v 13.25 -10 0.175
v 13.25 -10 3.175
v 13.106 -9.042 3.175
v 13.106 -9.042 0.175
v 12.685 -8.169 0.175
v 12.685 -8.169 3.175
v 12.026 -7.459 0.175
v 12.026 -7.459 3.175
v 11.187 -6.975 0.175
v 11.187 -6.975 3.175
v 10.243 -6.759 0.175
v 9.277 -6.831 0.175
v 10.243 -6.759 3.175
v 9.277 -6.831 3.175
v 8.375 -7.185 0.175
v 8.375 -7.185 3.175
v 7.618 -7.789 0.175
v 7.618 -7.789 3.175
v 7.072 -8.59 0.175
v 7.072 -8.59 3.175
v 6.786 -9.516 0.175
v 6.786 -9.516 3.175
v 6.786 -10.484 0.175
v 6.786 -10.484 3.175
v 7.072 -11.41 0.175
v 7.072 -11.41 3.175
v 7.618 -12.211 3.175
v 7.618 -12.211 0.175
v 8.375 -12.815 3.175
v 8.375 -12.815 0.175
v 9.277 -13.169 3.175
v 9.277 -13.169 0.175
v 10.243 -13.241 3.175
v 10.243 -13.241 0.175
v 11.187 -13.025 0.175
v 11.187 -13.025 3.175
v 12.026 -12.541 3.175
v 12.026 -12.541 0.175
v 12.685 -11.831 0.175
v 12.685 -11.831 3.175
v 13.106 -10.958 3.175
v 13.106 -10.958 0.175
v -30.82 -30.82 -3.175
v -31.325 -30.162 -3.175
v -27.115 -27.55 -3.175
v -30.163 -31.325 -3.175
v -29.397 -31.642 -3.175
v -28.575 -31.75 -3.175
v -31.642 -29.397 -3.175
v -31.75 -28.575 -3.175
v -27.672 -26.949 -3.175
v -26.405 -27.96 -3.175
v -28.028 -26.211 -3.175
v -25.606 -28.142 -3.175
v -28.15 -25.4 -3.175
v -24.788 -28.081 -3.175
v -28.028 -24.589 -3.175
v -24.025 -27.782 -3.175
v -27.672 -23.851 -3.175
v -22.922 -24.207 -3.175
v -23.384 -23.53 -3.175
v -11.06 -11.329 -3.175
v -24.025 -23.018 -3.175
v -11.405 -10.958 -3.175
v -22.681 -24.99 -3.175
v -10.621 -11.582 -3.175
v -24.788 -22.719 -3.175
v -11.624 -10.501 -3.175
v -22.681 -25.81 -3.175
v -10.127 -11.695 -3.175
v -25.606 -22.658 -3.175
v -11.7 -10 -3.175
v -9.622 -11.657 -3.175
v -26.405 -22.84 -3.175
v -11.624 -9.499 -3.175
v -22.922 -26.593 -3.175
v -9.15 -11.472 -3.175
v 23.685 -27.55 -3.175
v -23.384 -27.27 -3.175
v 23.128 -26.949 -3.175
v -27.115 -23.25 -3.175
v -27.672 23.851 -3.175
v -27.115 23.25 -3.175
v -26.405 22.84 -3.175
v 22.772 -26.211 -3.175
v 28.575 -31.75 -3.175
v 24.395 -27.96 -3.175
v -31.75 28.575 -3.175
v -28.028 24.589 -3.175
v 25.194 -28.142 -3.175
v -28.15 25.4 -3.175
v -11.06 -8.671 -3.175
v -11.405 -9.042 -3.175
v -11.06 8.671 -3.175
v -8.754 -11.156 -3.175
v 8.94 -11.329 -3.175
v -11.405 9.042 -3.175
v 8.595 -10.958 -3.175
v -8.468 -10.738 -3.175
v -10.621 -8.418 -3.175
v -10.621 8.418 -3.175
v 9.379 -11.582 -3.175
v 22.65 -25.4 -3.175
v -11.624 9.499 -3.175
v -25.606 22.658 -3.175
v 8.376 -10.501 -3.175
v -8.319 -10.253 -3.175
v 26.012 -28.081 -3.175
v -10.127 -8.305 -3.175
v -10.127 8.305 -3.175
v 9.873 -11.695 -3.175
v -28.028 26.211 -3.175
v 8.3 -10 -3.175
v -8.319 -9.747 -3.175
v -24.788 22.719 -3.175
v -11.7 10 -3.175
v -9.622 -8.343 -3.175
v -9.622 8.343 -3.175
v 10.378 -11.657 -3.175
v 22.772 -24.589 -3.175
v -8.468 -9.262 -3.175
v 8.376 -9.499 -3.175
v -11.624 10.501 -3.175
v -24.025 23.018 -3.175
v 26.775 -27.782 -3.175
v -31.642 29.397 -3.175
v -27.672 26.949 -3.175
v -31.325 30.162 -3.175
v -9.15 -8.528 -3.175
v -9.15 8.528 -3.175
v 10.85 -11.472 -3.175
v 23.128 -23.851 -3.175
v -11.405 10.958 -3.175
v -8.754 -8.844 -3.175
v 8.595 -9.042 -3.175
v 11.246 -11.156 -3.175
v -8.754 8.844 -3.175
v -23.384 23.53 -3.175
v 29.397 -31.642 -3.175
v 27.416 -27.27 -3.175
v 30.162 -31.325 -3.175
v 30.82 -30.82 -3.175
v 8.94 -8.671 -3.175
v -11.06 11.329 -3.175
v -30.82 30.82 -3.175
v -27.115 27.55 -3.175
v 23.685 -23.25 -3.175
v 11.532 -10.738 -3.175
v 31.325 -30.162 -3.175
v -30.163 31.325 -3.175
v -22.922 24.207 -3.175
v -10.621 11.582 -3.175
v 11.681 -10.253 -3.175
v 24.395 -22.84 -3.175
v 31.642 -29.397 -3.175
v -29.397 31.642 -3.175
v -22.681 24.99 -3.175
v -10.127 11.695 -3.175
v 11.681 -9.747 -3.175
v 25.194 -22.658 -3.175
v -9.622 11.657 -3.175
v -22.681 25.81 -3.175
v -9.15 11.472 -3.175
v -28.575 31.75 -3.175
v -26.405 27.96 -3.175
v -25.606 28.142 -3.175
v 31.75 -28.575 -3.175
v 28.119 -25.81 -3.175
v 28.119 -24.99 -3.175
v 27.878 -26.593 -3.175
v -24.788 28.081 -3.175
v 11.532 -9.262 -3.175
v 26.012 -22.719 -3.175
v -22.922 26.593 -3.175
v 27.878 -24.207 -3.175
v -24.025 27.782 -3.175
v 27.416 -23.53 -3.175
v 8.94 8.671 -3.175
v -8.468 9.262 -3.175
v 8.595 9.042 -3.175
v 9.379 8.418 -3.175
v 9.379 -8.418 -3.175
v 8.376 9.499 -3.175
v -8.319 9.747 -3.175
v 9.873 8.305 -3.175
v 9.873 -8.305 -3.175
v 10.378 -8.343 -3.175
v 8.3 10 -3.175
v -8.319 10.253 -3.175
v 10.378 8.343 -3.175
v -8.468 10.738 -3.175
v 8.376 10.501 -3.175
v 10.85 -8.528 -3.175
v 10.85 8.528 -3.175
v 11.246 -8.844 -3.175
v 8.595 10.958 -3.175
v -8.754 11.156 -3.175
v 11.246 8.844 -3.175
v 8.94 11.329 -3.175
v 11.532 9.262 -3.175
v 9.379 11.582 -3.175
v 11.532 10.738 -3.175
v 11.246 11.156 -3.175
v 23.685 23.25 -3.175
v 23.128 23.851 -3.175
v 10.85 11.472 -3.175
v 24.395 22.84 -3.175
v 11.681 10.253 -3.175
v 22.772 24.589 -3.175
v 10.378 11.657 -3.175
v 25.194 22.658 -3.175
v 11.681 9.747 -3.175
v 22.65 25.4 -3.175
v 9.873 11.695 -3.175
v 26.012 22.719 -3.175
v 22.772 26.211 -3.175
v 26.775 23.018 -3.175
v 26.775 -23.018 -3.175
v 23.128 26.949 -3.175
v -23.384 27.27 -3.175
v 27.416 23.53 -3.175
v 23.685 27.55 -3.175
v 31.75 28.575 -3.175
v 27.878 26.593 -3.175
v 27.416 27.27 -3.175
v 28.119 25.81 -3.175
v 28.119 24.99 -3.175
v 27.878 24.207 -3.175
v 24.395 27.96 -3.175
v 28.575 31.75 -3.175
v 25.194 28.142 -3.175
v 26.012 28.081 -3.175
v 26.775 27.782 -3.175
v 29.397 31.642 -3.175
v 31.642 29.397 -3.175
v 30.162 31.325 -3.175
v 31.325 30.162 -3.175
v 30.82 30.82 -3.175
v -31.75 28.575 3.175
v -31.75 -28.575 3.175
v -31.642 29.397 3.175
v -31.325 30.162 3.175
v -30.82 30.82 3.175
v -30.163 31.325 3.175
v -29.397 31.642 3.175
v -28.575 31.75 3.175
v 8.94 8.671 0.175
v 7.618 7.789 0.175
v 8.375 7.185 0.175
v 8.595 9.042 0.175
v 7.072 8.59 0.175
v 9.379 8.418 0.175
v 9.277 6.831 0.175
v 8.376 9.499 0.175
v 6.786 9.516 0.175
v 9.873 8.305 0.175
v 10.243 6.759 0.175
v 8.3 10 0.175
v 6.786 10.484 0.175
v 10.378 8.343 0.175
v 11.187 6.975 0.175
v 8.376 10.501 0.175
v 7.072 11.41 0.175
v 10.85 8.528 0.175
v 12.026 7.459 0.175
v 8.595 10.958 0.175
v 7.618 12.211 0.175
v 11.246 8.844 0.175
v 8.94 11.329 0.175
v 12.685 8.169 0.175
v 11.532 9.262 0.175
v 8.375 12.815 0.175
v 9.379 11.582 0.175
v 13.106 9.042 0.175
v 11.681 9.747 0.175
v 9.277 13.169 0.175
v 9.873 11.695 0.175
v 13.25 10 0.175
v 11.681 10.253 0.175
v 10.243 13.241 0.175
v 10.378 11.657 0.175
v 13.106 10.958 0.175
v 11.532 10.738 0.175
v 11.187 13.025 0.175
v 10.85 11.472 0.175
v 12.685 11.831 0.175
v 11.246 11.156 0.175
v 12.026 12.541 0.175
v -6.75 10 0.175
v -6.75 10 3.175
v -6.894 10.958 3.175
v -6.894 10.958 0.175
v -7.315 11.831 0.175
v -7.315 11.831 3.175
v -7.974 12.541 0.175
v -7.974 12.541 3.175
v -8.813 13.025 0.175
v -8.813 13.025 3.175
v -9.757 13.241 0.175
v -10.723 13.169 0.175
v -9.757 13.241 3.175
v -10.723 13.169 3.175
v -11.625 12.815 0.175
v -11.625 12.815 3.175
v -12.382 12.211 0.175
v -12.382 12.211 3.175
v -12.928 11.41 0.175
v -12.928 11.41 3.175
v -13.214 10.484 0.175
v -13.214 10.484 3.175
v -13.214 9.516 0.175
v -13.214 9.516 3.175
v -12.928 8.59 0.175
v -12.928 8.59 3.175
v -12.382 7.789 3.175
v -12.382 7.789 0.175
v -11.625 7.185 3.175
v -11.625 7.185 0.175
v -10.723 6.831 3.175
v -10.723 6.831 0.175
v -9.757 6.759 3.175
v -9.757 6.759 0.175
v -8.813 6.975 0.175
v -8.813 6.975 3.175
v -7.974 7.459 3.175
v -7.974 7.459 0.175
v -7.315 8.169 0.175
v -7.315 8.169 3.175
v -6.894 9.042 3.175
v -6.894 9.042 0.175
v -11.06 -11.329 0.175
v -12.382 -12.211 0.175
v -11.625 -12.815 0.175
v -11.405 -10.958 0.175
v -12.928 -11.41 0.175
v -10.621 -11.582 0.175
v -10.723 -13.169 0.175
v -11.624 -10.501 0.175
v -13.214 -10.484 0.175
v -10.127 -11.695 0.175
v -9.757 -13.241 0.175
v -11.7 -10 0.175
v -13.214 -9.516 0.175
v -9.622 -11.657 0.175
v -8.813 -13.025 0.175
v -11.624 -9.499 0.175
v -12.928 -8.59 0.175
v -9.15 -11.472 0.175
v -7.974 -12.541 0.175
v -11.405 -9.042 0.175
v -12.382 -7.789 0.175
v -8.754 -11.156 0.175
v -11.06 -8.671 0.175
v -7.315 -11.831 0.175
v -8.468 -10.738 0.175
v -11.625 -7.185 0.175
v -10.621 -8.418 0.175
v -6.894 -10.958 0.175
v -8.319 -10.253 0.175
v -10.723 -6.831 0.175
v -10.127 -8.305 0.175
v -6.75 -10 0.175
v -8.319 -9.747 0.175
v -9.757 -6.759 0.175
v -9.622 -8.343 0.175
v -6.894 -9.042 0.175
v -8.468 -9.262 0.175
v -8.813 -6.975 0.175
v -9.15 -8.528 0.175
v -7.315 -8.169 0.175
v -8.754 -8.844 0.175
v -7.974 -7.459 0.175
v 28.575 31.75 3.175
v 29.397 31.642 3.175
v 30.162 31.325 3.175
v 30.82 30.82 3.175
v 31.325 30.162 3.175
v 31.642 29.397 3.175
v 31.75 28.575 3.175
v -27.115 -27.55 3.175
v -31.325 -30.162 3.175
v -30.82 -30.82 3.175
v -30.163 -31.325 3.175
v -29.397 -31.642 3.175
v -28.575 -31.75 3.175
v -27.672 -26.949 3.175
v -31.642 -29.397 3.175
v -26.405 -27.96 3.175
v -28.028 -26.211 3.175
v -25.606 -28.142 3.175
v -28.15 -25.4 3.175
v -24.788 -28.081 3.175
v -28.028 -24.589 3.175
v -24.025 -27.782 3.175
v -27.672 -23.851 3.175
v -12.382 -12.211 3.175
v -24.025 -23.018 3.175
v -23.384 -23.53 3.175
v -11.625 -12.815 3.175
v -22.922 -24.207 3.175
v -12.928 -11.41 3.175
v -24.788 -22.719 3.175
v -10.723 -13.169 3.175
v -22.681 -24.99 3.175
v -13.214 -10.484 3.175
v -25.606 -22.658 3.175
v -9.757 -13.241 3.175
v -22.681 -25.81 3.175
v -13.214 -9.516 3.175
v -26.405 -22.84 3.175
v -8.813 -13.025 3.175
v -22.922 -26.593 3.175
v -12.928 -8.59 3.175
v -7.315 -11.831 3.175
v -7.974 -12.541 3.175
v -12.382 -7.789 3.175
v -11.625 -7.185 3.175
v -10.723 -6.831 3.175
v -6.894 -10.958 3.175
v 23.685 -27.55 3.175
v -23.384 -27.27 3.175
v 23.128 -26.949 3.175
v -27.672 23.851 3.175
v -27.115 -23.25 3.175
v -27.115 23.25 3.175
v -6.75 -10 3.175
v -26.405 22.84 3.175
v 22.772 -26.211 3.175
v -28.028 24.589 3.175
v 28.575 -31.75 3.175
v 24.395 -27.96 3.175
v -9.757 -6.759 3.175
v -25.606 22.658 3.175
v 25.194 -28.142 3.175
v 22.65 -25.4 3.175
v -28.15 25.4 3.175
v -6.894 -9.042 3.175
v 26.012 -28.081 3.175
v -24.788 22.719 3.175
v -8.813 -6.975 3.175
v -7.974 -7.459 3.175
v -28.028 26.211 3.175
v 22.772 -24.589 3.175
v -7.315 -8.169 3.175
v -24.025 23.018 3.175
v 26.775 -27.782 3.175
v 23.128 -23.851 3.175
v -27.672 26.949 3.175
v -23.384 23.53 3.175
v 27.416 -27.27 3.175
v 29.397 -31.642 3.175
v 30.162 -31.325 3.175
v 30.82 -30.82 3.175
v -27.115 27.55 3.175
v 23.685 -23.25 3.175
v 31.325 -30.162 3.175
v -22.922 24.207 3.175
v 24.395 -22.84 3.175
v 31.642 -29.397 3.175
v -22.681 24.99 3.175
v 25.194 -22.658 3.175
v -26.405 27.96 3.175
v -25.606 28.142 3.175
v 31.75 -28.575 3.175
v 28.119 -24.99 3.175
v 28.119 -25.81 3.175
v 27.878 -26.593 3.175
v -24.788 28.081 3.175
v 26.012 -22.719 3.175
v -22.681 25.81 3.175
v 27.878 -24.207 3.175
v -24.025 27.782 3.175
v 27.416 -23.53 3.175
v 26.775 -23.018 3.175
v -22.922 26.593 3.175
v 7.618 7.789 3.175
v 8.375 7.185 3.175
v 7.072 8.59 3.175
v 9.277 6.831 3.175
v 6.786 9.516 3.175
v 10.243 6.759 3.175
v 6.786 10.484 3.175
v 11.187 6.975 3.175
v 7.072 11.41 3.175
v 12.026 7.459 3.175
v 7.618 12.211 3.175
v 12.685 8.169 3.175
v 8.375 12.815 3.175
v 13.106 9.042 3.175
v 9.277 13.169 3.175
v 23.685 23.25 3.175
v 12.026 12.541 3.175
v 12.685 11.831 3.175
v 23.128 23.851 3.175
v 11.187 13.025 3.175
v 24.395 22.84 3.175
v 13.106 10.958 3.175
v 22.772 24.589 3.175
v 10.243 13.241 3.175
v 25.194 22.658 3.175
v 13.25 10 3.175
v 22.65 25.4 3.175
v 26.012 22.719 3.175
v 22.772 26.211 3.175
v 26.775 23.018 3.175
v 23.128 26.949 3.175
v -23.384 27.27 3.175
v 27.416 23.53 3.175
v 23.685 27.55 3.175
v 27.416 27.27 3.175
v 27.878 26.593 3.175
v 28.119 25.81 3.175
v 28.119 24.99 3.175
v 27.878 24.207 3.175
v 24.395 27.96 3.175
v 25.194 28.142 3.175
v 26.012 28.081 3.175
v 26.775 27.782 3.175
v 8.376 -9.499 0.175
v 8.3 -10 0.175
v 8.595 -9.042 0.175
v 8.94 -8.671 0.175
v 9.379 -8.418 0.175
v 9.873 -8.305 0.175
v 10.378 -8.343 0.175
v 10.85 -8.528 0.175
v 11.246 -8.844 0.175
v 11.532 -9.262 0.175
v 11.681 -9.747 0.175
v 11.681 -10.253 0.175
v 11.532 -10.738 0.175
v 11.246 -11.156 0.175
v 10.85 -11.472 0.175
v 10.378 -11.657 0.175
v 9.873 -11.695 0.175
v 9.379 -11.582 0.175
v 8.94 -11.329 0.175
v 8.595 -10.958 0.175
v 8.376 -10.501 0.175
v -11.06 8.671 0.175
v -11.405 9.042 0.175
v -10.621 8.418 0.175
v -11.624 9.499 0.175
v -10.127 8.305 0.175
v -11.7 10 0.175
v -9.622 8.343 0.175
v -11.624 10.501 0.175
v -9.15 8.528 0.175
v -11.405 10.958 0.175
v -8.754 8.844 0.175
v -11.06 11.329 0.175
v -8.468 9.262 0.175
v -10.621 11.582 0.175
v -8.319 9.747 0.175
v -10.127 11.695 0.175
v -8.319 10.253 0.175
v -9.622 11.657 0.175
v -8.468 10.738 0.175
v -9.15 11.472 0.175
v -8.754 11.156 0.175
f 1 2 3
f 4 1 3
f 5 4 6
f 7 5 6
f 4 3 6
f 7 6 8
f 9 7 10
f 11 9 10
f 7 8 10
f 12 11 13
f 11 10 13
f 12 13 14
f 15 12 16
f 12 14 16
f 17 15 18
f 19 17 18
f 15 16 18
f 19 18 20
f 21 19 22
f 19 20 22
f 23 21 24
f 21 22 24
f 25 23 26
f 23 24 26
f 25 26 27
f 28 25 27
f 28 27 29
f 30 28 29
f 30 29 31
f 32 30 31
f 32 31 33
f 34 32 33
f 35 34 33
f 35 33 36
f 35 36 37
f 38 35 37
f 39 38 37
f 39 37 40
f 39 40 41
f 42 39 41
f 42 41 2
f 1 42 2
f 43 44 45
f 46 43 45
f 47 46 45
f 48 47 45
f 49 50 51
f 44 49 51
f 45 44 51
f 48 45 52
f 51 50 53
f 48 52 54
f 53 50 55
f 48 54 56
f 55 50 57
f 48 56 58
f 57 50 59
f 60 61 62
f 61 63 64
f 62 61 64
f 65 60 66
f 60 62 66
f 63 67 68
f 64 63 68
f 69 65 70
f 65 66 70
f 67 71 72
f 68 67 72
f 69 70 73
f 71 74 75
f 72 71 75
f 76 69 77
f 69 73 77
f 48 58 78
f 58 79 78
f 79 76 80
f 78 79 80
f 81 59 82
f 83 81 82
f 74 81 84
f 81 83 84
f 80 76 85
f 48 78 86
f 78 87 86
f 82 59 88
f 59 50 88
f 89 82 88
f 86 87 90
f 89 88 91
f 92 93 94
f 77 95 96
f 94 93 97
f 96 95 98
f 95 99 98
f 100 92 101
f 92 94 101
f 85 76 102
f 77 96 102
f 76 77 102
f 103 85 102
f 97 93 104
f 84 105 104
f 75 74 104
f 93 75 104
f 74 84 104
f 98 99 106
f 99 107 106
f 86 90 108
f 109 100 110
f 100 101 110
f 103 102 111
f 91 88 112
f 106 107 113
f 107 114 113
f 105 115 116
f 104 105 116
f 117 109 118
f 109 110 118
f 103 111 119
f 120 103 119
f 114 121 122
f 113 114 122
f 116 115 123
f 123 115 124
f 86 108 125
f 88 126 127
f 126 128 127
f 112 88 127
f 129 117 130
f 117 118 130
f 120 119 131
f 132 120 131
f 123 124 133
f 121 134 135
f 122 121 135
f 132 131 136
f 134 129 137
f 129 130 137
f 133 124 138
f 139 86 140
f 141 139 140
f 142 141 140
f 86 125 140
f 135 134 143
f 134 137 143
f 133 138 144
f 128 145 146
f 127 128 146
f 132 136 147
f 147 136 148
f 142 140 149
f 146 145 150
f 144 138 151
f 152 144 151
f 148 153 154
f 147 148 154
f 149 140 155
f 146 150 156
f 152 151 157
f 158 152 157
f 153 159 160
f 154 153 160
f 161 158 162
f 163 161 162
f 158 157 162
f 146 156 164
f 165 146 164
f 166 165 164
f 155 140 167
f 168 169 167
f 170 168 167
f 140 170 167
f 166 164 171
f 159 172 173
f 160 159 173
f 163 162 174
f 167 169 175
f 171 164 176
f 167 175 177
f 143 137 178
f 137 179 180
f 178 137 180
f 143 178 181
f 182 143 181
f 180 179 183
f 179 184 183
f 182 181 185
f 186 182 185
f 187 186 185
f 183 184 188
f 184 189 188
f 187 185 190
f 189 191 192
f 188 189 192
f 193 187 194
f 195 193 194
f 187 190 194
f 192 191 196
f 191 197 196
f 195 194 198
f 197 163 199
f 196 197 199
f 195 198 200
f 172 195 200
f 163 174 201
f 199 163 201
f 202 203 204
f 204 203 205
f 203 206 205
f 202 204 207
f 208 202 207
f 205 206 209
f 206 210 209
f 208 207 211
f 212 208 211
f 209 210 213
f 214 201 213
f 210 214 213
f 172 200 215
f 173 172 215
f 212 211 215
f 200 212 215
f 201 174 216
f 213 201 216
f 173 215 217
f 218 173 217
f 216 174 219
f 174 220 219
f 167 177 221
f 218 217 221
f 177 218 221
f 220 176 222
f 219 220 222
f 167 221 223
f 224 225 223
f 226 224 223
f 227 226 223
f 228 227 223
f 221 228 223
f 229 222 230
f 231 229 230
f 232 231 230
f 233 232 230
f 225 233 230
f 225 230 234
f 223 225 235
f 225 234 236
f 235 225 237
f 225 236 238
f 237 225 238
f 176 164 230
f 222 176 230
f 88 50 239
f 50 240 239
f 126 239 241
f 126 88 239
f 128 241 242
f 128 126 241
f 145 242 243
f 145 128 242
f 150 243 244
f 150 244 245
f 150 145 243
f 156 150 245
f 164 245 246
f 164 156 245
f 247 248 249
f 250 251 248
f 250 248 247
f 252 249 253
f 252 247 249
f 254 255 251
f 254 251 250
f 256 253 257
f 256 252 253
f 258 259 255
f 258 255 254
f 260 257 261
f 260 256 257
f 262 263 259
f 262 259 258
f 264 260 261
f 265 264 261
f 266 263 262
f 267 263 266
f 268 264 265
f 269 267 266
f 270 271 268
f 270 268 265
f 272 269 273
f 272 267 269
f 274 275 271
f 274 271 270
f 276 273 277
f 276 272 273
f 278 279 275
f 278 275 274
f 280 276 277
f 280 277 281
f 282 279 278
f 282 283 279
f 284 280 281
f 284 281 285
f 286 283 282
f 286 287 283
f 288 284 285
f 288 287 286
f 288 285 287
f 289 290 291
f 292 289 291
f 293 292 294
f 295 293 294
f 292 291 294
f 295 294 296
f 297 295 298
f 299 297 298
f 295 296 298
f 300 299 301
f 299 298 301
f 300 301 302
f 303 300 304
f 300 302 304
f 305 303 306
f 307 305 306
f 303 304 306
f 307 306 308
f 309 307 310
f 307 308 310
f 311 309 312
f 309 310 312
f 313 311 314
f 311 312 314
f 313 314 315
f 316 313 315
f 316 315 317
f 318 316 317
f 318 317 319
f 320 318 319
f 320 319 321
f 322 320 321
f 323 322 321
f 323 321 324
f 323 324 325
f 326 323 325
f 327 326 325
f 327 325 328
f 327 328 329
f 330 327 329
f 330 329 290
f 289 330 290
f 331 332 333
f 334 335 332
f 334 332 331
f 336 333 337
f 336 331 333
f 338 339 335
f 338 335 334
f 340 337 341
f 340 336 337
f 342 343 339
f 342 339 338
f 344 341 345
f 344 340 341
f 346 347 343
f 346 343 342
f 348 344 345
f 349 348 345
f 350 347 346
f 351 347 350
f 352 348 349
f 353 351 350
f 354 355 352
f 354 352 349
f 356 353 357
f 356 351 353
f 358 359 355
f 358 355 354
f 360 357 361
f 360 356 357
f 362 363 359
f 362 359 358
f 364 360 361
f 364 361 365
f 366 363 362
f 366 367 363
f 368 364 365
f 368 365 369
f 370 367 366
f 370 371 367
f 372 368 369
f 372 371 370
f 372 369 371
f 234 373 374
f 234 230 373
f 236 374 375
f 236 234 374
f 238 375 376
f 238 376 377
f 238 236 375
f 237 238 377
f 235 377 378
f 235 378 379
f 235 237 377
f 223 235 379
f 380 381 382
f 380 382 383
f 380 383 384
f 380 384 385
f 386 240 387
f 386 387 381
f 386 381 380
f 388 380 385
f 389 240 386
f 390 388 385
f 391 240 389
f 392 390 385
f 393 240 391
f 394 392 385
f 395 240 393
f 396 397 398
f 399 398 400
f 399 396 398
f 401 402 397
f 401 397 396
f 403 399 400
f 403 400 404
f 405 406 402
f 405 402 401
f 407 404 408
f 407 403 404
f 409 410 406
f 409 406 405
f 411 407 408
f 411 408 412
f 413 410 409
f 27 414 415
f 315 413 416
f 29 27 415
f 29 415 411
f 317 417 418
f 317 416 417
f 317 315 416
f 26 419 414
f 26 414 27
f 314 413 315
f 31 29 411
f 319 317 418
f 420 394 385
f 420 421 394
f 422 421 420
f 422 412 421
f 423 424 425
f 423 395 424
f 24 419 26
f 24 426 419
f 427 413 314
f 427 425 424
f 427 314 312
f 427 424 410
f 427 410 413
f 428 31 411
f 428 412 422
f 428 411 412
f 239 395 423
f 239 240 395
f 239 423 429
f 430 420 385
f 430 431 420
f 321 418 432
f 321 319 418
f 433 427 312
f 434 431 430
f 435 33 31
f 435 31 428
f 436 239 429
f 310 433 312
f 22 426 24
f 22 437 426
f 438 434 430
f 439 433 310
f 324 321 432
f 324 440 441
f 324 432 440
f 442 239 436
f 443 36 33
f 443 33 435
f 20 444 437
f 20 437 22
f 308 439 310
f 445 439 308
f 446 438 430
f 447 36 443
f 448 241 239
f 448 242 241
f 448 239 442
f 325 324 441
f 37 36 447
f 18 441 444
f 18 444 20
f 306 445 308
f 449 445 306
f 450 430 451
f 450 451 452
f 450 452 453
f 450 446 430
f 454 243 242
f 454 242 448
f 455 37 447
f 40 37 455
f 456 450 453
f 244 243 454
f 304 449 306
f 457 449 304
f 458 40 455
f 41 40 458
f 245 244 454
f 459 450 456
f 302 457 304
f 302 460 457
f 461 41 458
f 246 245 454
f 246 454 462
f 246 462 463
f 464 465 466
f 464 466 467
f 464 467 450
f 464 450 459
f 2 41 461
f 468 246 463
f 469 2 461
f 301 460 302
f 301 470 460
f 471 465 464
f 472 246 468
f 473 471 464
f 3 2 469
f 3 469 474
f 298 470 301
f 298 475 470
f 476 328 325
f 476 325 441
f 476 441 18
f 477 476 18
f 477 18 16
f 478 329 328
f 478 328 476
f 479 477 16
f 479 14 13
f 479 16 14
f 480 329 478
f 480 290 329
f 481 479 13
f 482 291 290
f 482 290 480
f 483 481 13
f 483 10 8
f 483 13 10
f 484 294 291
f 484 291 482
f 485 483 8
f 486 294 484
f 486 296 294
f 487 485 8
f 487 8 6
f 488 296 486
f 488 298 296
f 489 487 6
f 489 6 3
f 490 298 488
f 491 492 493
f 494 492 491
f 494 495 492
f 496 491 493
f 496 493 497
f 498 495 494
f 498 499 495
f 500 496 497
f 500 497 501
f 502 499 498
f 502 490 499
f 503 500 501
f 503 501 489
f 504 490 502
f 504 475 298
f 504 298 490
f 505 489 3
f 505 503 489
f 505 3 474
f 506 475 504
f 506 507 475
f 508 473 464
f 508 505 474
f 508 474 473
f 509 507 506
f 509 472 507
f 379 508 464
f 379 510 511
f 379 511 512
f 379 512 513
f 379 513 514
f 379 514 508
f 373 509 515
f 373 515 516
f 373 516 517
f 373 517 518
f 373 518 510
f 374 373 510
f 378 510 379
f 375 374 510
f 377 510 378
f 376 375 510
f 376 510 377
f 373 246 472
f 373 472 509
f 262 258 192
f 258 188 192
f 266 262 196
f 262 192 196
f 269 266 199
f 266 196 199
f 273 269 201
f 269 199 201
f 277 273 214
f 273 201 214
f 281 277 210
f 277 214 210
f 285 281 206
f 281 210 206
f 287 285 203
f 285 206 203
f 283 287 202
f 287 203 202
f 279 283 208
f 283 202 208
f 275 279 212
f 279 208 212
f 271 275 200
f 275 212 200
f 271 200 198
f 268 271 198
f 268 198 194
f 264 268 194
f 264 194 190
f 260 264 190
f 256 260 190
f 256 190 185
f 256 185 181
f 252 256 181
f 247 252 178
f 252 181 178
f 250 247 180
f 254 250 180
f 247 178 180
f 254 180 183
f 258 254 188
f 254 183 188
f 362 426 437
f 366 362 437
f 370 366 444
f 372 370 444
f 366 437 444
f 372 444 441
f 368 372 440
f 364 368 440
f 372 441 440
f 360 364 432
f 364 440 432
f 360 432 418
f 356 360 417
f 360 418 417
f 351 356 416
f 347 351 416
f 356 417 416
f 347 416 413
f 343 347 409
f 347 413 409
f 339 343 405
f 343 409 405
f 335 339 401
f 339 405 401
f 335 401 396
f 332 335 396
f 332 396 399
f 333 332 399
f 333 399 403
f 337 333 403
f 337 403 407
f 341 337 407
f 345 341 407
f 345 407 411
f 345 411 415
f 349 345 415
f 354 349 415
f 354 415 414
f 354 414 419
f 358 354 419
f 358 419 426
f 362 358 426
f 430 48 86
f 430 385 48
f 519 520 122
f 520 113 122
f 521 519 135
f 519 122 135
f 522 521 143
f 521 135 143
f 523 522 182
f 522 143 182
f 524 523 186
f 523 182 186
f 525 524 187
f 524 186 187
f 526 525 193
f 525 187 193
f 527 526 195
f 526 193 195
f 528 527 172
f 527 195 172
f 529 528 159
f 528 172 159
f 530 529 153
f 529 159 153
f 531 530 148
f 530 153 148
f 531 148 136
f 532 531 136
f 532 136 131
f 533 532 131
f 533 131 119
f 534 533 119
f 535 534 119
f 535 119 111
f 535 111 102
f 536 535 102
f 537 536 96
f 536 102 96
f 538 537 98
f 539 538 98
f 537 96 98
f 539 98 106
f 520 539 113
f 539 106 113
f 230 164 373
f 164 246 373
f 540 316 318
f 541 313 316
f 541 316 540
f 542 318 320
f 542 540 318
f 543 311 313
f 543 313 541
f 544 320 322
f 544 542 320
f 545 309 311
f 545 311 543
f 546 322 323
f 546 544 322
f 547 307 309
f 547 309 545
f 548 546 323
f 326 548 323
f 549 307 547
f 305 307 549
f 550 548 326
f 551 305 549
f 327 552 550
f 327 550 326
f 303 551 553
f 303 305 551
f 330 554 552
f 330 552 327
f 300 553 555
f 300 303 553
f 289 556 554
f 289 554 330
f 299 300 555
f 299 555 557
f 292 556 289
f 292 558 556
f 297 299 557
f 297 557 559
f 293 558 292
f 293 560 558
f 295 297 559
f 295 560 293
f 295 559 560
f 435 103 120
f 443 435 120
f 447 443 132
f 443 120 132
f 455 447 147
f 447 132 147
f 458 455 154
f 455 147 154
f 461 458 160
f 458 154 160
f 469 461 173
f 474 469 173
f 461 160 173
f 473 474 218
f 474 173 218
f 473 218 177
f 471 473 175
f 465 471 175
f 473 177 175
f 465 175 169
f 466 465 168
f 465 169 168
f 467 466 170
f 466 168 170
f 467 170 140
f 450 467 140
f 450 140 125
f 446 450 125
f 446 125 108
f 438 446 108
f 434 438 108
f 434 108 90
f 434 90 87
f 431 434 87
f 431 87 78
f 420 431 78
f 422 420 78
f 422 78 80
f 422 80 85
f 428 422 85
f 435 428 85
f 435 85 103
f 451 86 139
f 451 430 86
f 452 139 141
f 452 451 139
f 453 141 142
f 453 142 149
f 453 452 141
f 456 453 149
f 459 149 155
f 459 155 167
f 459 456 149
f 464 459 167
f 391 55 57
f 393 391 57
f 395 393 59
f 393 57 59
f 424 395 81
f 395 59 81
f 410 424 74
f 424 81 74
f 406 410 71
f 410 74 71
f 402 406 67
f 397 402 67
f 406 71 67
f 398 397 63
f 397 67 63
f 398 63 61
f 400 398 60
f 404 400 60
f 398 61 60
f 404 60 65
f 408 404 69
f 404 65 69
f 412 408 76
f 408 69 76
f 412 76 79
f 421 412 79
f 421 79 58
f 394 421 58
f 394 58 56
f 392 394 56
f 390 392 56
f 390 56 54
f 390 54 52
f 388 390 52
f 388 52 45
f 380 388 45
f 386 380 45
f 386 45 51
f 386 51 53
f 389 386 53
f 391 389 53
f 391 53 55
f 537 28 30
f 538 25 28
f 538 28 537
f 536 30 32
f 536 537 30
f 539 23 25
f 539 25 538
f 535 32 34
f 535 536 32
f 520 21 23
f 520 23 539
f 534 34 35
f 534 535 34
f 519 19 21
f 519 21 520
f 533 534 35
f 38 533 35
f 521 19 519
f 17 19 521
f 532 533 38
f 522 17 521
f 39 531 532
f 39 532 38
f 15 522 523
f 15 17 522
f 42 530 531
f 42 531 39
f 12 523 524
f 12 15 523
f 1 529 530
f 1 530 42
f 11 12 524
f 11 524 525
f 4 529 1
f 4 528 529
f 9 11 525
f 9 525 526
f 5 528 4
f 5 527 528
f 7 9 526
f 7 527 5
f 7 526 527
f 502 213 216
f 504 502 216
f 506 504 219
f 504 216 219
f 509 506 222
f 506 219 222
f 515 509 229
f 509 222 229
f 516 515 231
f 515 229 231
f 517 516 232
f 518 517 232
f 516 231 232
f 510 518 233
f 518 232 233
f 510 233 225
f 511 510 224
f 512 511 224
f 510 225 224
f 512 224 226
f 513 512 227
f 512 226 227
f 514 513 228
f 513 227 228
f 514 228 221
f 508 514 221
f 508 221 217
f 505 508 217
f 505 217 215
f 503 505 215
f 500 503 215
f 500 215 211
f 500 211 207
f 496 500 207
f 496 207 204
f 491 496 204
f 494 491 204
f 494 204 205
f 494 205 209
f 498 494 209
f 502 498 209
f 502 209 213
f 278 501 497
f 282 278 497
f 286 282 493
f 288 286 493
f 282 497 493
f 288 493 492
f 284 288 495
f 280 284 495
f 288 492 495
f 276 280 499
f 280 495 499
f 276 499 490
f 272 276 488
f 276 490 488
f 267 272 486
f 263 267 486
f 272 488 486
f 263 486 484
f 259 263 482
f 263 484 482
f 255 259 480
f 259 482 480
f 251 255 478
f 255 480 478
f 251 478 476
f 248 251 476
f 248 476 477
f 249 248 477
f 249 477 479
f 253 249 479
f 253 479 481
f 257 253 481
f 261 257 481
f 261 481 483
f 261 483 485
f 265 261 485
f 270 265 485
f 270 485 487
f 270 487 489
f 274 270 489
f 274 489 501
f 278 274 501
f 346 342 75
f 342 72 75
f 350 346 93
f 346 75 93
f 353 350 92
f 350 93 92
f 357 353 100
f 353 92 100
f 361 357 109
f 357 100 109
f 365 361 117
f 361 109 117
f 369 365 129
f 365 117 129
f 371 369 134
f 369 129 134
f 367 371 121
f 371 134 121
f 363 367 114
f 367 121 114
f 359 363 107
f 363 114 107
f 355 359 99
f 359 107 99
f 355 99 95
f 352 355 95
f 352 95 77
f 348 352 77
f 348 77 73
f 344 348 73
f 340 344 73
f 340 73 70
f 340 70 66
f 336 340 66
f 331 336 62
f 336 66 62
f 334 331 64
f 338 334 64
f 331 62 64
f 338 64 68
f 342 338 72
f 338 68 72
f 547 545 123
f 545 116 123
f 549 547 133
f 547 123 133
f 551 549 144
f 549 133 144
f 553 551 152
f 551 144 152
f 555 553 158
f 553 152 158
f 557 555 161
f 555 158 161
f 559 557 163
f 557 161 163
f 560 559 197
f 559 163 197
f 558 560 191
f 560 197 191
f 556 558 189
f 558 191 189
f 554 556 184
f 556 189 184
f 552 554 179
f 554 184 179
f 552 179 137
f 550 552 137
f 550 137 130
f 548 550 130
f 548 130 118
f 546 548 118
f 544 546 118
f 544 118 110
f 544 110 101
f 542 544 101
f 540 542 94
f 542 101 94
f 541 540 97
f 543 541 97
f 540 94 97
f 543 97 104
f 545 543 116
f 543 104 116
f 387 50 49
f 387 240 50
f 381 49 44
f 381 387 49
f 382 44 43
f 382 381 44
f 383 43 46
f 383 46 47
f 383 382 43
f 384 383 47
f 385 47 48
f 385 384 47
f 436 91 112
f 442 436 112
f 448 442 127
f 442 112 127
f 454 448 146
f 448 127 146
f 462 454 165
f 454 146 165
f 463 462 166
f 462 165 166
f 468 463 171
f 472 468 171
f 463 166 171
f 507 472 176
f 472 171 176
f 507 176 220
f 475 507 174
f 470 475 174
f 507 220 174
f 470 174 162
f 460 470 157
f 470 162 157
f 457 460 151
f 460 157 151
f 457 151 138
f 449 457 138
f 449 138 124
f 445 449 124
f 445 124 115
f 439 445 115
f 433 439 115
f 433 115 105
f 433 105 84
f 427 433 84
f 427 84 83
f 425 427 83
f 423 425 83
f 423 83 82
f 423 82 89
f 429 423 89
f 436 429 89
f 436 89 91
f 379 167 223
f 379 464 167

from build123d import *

# Parameters (mm, degrees)
SKETCH1_W                      = 63.5
SKETCH1_H                      = 63.5
BOSS_EXTRUDE1_DEPTH            = 3.175
CBORE_FOR_M3_SHCS1_D           = 3.4
CBORE_FOR_M3_SHCS1_CBORE_D     = 6.5
CBORE_FOR_M3_SHCS1_CBORE_DEPTH = 3
M5_CLEARANCE_HOLE1_D           = 5.5
FILLET1_R                      = 3.175


with BuildPart() as part:
    # Sketch1 → Boss-Extrude1 (new, symmetric)
    with BuildSketch(Plane.XY):
        Rectangle(SKETCH1_W, SKETCH1_H)
    extrude(amount=BOSS_EXTRUDE1_DEPTH, both=True)

    # CBORE for M3 SHCS1 (through all)
    with Locations(Plane.XY.offset(3.175)):
        with Locations((-10, -10), (10, 10), (-10, 10), (10, -10)):
            CounterBoreHole(CBORE_FOR_M3_SHCS1_D / 2, CBORE_FOR_M3_SHCS1_CBORE_D / 2, CBORE_FOR_M3_SHCS1_CBORE_DEPTH)

    # M5 Clearance Hole1 (through all)
    with Locations(Plane.XY.offset(3.175)):
        with Locations((-25.4, -25.4), (-25.4, 25.4), (25.4, -25.4), (25.4, 25.4)):
            Hole(M5_CLEARANCE_HOLE1_D / 2)

    # Fillet1
    fillet1_edges = [part.edges().sort_by_distance(p)[0] for p in [
        (-31.75, 31.75, 0),
        (31.75, 31.75, 0),
        (31.75, -31.75, 0),
        (-31.75, -31.75, 0),
    ]]
    fillet(fillet1_edges, radius=FILLET1_R)


solid = part.part
